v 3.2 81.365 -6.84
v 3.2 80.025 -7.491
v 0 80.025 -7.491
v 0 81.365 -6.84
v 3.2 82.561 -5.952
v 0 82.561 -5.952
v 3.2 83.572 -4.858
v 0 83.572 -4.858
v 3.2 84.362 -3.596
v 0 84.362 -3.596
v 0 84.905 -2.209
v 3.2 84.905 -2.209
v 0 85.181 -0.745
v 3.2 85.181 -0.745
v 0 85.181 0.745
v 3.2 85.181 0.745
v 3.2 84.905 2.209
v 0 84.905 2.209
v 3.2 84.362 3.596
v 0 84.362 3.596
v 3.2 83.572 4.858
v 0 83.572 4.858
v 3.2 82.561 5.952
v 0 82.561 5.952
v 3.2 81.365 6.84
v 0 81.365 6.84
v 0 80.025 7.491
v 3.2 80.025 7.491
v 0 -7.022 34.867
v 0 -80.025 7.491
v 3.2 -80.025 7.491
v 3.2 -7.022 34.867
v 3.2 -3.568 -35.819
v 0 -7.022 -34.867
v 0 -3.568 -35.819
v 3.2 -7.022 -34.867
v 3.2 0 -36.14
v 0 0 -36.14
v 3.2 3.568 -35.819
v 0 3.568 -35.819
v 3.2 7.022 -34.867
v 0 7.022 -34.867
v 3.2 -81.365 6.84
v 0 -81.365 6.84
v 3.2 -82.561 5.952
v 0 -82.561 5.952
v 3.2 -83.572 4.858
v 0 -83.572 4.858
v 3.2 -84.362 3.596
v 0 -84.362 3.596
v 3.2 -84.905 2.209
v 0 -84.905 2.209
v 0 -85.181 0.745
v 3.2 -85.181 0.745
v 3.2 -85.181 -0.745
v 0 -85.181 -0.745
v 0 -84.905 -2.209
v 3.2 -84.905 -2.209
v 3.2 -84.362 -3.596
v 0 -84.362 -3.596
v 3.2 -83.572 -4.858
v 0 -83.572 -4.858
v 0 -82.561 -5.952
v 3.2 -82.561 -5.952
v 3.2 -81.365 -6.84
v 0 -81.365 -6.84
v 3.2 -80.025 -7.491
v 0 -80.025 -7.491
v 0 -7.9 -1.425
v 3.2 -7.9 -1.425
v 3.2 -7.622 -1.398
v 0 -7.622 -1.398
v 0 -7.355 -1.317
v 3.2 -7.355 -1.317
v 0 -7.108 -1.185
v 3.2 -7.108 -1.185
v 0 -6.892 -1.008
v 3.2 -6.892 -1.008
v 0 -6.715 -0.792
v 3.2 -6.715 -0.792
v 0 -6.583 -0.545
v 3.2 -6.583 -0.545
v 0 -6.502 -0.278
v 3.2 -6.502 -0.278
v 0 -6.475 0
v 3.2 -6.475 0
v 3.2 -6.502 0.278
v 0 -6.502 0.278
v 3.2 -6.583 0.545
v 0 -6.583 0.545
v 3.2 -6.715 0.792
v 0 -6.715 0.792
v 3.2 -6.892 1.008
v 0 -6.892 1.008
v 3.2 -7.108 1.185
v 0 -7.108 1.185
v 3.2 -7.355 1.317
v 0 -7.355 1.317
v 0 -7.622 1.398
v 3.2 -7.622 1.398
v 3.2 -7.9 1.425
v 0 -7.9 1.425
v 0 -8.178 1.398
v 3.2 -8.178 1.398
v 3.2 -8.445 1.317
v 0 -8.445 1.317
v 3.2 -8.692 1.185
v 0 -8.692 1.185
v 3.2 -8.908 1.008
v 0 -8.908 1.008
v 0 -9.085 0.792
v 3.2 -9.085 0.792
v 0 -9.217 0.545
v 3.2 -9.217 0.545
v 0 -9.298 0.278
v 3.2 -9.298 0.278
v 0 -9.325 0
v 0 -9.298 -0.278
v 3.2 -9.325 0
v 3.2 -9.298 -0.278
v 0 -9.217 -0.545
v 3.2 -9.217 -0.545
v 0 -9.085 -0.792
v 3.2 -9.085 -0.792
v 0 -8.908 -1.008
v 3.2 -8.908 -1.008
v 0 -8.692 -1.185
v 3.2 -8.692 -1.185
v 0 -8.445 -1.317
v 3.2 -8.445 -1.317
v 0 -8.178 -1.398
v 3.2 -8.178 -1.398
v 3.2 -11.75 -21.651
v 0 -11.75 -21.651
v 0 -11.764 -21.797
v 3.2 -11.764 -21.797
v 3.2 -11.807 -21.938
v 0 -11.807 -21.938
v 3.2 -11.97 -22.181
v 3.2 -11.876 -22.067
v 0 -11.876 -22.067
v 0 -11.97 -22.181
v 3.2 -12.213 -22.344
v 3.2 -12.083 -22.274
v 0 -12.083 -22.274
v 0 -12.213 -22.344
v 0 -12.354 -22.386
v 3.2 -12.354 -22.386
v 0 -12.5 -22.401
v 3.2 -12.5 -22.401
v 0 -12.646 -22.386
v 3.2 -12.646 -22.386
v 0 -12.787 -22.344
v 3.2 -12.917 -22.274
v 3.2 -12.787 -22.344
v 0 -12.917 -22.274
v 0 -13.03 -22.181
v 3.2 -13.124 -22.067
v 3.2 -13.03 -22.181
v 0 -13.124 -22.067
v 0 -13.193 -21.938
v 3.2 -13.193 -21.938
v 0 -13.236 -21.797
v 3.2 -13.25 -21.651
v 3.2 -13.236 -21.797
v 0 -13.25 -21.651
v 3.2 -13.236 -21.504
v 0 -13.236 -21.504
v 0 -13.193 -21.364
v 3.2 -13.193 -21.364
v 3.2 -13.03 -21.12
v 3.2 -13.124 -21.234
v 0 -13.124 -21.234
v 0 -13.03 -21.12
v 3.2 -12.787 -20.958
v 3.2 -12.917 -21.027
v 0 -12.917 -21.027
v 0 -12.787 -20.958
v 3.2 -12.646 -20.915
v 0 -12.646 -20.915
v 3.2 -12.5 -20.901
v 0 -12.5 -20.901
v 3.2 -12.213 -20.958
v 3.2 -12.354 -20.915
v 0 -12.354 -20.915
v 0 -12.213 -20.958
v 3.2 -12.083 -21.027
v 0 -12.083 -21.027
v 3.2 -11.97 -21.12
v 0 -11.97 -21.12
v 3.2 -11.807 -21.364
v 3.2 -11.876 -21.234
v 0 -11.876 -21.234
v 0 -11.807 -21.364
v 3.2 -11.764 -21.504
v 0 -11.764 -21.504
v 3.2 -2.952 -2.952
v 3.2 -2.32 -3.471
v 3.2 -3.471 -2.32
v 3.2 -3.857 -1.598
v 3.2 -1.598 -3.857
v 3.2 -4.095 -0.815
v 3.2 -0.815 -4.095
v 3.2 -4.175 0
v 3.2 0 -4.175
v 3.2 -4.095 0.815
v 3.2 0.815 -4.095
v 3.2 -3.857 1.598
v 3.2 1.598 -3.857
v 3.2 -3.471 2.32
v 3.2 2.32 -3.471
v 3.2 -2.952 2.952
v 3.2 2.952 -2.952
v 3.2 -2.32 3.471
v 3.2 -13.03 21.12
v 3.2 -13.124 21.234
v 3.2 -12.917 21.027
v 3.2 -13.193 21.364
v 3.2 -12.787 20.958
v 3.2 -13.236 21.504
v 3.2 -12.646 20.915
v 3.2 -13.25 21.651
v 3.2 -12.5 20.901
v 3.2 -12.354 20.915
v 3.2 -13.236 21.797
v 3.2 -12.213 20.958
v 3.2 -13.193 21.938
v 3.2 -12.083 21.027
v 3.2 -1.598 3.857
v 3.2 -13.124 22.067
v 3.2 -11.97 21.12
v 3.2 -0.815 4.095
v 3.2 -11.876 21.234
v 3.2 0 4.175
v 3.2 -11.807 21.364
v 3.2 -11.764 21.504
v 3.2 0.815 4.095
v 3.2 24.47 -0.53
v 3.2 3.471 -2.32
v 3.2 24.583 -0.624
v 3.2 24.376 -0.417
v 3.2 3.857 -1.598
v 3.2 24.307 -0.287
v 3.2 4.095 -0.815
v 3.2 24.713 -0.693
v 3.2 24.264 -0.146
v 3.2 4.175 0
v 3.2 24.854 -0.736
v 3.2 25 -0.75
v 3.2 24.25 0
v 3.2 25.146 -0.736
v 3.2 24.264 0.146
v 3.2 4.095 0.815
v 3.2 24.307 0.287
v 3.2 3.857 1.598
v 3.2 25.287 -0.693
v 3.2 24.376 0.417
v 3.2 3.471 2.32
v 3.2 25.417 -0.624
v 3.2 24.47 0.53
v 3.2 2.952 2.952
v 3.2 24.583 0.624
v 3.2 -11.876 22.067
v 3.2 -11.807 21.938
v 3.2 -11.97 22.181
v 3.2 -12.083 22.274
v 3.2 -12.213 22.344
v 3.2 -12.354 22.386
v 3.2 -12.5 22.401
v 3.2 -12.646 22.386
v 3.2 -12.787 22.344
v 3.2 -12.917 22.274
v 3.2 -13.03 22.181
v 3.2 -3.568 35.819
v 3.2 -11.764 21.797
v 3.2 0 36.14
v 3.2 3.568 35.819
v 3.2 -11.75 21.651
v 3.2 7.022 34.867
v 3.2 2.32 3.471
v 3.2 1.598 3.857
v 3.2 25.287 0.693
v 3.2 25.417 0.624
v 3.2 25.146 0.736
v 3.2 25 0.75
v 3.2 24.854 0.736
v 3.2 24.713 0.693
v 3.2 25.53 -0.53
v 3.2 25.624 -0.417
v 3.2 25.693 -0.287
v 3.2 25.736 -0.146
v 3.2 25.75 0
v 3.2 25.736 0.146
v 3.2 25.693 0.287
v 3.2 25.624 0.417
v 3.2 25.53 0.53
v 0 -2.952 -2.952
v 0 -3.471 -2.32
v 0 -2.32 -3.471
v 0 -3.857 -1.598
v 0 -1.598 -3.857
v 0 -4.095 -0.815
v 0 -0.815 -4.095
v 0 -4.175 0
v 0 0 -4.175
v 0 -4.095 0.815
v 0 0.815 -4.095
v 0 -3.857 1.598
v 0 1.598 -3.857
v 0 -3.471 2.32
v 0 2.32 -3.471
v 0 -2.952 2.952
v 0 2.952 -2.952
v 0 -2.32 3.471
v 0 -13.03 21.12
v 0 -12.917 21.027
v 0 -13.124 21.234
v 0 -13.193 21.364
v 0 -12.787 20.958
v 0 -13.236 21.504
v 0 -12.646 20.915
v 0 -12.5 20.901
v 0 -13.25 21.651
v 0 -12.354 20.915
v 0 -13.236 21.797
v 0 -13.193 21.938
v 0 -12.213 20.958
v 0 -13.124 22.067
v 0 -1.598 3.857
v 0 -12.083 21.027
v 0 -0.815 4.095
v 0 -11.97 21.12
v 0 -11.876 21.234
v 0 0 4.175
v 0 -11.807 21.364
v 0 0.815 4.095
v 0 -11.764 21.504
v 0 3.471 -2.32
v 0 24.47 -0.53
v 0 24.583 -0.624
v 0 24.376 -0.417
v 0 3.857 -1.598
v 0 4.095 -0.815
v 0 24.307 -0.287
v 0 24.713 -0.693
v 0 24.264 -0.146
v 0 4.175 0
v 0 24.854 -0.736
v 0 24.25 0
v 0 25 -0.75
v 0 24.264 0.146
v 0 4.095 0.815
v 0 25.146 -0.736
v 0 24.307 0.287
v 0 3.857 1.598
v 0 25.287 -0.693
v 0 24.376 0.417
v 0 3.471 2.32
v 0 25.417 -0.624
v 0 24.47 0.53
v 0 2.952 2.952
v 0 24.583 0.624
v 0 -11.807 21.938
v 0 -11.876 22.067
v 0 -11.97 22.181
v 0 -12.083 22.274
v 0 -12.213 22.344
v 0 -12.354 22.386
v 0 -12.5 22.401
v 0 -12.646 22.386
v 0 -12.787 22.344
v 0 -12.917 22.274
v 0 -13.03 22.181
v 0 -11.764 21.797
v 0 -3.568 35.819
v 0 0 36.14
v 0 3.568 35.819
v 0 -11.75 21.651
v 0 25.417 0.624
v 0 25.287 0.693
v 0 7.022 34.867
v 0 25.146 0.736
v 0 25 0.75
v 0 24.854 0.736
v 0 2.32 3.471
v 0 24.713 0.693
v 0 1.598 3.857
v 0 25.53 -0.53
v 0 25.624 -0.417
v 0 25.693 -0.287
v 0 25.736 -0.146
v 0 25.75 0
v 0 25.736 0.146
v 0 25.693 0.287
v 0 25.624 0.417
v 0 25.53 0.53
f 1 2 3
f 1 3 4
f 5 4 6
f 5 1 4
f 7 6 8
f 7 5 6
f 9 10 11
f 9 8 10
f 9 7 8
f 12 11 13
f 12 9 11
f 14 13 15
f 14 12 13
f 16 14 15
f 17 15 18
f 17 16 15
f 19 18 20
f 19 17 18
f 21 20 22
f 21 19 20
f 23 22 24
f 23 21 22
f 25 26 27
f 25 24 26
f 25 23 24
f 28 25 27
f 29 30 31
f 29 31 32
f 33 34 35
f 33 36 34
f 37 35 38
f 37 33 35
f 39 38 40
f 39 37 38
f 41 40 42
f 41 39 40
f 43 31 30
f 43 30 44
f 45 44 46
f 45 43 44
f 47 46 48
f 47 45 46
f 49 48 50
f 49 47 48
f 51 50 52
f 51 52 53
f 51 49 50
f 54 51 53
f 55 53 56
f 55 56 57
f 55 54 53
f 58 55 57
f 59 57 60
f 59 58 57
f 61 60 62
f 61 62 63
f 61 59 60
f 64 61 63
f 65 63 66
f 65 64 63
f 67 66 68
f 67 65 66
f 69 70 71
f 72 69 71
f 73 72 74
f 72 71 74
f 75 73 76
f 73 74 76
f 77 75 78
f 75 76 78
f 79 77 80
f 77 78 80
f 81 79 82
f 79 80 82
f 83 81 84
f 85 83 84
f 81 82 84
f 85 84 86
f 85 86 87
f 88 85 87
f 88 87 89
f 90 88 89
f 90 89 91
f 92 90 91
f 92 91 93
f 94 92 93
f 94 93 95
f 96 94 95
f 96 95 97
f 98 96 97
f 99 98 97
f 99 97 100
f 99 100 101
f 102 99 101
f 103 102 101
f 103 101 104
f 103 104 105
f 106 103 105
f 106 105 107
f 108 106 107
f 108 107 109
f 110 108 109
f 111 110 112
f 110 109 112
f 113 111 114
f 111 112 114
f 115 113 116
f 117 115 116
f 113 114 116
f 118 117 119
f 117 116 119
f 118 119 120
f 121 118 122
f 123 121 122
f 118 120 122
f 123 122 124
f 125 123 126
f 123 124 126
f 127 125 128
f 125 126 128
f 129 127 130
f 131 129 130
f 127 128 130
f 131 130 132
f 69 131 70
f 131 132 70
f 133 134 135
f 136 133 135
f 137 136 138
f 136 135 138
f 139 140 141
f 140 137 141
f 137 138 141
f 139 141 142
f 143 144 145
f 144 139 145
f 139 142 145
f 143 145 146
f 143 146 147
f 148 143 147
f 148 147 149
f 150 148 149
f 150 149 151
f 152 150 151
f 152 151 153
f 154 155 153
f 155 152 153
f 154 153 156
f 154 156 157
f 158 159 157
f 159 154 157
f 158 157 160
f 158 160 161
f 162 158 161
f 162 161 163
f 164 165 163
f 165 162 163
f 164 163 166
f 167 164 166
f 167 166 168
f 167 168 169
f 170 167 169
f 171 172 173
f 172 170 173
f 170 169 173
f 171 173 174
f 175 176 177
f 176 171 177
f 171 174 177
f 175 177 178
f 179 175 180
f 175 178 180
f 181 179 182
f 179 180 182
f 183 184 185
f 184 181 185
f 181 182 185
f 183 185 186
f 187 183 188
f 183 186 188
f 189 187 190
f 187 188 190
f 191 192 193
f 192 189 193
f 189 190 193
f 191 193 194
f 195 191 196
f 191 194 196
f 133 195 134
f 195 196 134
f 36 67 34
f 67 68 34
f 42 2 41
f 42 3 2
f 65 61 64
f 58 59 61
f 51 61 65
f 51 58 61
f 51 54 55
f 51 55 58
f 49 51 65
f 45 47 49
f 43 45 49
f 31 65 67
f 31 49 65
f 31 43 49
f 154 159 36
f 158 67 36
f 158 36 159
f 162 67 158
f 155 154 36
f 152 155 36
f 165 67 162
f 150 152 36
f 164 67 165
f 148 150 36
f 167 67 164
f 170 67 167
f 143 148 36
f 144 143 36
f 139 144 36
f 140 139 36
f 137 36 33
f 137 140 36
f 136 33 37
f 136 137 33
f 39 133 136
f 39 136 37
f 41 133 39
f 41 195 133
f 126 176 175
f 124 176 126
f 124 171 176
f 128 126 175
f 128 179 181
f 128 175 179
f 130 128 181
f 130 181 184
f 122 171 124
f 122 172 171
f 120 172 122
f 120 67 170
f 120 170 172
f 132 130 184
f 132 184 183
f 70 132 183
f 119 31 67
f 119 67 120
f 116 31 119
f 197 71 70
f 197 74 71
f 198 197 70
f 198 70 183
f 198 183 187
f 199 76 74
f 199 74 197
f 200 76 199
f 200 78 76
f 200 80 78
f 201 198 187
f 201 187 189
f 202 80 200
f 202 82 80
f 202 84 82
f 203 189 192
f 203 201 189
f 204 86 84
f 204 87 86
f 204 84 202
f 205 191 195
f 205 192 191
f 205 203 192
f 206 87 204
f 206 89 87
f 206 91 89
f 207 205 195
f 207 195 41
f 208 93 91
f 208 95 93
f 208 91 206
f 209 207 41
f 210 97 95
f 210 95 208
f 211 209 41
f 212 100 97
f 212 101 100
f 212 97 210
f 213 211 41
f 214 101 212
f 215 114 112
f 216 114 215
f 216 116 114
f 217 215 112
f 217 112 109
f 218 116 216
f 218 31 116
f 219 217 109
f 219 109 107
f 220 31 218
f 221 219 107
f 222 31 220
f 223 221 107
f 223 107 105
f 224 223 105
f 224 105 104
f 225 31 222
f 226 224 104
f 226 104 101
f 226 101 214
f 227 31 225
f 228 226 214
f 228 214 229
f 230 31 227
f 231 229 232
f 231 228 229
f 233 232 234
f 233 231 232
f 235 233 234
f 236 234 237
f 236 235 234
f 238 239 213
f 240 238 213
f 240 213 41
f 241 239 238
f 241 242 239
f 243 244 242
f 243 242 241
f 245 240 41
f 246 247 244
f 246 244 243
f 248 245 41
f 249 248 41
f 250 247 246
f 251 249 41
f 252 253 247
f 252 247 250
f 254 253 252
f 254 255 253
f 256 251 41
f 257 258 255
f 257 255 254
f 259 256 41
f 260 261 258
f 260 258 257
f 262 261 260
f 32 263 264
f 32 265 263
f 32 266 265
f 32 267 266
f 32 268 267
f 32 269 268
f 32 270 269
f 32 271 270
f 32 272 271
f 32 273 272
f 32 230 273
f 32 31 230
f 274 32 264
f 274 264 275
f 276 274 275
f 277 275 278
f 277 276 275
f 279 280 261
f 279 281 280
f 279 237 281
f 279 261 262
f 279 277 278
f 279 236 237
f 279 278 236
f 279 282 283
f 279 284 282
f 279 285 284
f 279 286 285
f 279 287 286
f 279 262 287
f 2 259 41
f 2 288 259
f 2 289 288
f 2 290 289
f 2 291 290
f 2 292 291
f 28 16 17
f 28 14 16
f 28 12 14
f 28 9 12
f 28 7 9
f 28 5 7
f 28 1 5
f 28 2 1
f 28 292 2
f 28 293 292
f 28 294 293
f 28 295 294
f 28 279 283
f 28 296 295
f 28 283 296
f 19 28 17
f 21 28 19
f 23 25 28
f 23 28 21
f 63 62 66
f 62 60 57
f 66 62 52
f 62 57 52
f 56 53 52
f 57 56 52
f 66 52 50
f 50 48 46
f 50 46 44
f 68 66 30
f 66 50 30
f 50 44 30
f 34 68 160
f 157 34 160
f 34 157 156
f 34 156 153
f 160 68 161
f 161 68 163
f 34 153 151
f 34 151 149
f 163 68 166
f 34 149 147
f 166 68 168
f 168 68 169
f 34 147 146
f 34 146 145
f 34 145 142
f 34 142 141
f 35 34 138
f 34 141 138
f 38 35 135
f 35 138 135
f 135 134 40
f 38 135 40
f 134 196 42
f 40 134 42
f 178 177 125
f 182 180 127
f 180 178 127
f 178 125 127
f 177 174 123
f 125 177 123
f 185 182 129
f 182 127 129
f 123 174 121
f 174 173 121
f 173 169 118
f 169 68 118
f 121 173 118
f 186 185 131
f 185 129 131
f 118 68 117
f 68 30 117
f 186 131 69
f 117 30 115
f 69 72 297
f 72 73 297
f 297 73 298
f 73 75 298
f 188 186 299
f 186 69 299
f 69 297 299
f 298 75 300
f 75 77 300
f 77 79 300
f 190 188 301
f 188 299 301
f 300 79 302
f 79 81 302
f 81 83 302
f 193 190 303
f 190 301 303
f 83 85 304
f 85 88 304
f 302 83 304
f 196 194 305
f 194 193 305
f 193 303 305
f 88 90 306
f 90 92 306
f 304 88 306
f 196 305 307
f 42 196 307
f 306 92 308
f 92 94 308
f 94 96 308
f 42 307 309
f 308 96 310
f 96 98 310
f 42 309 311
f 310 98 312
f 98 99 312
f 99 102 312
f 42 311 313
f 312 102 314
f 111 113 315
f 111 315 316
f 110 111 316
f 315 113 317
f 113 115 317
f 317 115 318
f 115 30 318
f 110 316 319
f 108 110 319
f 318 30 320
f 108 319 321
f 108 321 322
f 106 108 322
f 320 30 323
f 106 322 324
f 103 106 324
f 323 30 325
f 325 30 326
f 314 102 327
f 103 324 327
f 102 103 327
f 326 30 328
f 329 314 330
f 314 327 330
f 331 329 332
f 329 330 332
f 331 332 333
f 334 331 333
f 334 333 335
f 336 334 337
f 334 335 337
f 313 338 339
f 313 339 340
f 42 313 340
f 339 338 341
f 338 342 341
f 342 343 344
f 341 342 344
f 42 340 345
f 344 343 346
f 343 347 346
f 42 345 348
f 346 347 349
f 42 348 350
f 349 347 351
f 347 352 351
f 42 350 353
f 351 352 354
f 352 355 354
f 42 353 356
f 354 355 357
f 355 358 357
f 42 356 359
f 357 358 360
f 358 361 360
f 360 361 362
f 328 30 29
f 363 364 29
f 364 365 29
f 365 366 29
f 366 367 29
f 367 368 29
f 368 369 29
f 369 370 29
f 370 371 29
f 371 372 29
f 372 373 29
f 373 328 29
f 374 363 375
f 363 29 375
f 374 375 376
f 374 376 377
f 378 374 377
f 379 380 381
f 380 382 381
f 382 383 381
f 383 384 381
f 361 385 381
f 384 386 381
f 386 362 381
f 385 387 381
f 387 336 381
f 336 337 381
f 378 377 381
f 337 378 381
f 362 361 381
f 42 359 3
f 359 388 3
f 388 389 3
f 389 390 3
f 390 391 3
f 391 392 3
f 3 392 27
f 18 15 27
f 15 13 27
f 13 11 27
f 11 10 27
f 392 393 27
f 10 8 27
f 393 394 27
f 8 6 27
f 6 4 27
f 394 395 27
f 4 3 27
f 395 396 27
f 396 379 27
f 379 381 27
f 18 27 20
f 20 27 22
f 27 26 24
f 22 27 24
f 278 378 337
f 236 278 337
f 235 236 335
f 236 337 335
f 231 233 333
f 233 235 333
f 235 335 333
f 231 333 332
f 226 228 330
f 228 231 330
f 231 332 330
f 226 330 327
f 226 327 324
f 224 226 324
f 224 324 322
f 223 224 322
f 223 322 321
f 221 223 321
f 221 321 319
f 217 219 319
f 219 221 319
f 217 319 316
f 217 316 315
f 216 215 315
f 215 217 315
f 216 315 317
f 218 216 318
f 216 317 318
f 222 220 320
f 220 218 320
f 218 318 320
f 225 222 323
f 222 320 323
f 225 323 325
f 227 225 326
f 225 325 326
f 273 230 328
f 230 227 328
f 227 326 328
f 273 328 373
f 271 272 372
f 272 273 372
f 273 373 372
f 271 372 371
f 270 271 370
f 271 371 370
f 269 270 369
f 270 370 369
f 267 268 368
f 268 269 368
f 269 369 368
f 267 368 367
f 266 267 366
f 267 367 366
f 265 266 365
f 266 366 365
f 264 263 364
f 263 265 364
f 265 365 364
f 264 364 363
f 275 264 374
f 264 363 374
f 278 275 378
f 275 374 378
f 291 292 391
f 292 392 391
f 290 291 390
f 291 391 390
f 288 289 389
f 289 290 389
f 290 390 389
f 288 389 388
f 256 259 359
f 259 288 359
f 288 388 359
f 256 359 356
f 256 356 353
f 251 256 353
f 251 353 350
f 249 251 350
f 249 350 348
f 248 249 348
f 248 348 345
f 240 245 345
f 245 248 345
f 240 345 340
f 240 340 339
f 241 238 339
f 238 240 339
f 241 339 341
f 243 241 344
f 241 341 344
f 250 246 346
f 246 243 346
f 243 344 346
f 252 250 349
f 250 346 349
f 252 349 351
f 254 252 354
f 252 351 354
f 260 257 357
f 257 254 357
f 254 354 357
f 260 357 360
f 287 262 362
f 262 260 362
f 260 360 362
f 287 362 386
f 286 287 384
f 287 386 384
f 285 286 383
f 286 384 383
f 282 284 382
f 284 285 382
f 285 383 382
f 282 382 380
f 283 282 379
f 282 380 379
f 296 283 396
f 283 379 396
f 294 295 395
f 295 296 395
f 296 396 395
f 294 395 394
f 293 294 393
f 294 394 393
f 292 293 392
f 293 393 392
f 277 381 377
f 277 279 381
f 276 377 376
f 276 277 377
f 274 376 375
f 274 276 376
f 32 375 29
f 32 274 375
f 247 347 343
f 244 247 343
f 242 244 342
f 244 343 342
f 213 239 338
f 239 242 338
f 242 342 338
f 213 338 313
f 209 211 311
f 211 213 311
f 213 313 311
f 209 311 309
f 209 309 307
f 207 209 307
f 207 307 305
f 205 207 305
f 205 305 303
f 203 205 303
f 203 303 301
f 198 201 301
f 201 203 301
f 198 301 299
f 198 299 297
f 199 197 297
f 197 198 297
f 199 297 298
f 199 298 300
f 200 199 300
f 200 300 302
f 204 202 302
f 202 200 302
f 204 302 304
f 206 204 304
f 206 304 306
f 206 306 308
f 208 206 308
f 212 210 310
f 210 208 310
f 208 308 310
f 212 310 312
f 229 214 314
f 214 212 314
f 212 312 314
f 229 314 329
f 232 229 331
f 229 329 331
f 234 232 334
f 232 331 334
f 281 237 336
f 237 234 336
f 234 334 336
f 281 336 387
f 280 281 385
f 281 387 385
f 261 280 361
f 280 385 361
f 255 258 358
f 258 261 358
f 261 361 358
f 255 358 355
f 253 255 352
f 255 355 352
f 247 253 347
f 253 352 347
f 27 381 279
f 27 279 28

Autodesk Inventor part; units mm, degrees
ref_plane "YZ Plane" through (0, 0, 0) normal (1, 0, 0) x (0, 1, 0)
ref_plane "XZ Plane" through (0, 0, 0) normal (0, 1, 0) x (-1, 0, 0)
ref_plane "XY Plane" through (0, 0, 0) normal (0, 0, 1) x (1, 0, 0)
sketch "Sketch1" plane through (0, 0, 0) normal (1, 0, 0) x (0, 1, 0)
  line L0 (-122.5, 0) -> (122.5, 0) construction
  line L1 (0, -52.5) -> (0, 52.5) construction
  line L2 (-100, 0) -> (0, 37.5)
  line L3 (0, 37.5) -> (100, 0)
  line L4 (100, 0) -> (0, -37.5)
  line L5 (-100, 0) -> (0, -37.5)
  circle A0 centre (0, 0) radius 4.175
  circle A1 centre (25, 0) radius 0.75
  line L6 (25, 0) -> (-12.5, -21.6506) construction
  line L7 (-12.5, -21.6506) -> (-12.5, 21.6506) construction
  line L8 (-12.5, 21.6506) -> (25, 0) construction
  circle A2 centre (-12.5, 21.6506) radius 0.75
  circle A3 centre (-12.5, -21.6506) radius 0.75
  circle A4 centre (0, 0) radius 25 construction
  dimension "d7" = 50
  dimension "d3" = 8.35
  dimension "d4" = 1.5
  dimension "d11" = 75
  dimension "d24" = 200
extrude "Extrusion1" add sketch "Sketch1" along normal blind 3.2
fillet "Fillet1" radius 20 2 edges at (1.6, 0, 37.5) (1.6, 0, -37.5)
sketch "Sketch4" plane through (3.2, 0, 0) normal (1, 0, 0) x (0, 0, -1)
  circle A0 centre (0, 0) radius 4.175 projected
  circle A1 centre (0, -7.9) radius 1.425
  dimension "d20" = 7.9
  dimension "d21" = 2.85
extrude "Extrusion4" cut sketch "Sketch4" against normal through all contours A1
fillet "Fillet4" radius 8 2 edges at (1.6, 100, 0) (1.6, -100, 0)
sketch "Sketch5" plane through (0, 0, 0) normal (-1, 0, 0) x (0, 0, 1)
  circle A0 centre (-21.6506, -12.5) radius 0.75 projected
  circle A1 centre (-2.0715, -16.5813) radius 1.425
  line L0 (-2.0715, -16.5813) -> (-21.6506, -12.5) construction
  circle A2 centre (0, -7.9) radius 1.425 projected
  circle A3 centre (0, 0) radius 4.175 projected
  circle A4 centre (-2.0715, -16.5813) radius 7.5 construction
  line L1 (-2.0715, -16.5813) -> (7.7181, -18.6219) construction
  circle A5 centre (7.7181, -18.6219) radius 1.425
  circle A6 centre (15.3955, 6.4967) radius 1.425
  circle A7 centre (12.268, 15.995) radius 1.425
  circle A8 centre (-13.3241, 10.0846) radius 1.425
  circle A9 centre (-19.9861, 2.6269) radius 1.425
  point P0 (22.1831, -13.0282)
  point P1 (-22.1831, -13.0282)
  dimension "d31" = 2.85
  dimension "d32" = 20
  dimension "d33" = 15
  dimension "d38" = 10
  dimension "d41" = 360
sketch "Sketch3" plane through (3.2, 0, 0) normal (1, 0, 0) x (0, 0, -1)
  line L0 (-7.7286, 24.361) -> (0, 66.8014)
  line L1 (0, 66.8014) -> (7.7286, 24.361)
  line L2 (8.0286, -24.361) -> (0, -68.4486)
  line L3 (0, -68.4486) -> (-8.0286, -24.361)
  line L4 (-7.7286, 24.361) -> (7.7286, 24.361)
  line L5 (-8.0286, -24.361) -> (8.0286, -24.361)
  line L6 (52.5, 0) -> (-52.5, 0) projected
sketch "Sketch2" plane through (3.2, 0, 0) normal (1, 0, 0) x (0, 0, -1)
  circle A0 centre (0, 0) radius 4.175 projected
  circle A1 centre (0, 0) radius 3.048
  dimension "d13" = 6.096
equation "\"d24\" = Height"
equation "\"Height\" = 200"
properties part number "RibSimple"
